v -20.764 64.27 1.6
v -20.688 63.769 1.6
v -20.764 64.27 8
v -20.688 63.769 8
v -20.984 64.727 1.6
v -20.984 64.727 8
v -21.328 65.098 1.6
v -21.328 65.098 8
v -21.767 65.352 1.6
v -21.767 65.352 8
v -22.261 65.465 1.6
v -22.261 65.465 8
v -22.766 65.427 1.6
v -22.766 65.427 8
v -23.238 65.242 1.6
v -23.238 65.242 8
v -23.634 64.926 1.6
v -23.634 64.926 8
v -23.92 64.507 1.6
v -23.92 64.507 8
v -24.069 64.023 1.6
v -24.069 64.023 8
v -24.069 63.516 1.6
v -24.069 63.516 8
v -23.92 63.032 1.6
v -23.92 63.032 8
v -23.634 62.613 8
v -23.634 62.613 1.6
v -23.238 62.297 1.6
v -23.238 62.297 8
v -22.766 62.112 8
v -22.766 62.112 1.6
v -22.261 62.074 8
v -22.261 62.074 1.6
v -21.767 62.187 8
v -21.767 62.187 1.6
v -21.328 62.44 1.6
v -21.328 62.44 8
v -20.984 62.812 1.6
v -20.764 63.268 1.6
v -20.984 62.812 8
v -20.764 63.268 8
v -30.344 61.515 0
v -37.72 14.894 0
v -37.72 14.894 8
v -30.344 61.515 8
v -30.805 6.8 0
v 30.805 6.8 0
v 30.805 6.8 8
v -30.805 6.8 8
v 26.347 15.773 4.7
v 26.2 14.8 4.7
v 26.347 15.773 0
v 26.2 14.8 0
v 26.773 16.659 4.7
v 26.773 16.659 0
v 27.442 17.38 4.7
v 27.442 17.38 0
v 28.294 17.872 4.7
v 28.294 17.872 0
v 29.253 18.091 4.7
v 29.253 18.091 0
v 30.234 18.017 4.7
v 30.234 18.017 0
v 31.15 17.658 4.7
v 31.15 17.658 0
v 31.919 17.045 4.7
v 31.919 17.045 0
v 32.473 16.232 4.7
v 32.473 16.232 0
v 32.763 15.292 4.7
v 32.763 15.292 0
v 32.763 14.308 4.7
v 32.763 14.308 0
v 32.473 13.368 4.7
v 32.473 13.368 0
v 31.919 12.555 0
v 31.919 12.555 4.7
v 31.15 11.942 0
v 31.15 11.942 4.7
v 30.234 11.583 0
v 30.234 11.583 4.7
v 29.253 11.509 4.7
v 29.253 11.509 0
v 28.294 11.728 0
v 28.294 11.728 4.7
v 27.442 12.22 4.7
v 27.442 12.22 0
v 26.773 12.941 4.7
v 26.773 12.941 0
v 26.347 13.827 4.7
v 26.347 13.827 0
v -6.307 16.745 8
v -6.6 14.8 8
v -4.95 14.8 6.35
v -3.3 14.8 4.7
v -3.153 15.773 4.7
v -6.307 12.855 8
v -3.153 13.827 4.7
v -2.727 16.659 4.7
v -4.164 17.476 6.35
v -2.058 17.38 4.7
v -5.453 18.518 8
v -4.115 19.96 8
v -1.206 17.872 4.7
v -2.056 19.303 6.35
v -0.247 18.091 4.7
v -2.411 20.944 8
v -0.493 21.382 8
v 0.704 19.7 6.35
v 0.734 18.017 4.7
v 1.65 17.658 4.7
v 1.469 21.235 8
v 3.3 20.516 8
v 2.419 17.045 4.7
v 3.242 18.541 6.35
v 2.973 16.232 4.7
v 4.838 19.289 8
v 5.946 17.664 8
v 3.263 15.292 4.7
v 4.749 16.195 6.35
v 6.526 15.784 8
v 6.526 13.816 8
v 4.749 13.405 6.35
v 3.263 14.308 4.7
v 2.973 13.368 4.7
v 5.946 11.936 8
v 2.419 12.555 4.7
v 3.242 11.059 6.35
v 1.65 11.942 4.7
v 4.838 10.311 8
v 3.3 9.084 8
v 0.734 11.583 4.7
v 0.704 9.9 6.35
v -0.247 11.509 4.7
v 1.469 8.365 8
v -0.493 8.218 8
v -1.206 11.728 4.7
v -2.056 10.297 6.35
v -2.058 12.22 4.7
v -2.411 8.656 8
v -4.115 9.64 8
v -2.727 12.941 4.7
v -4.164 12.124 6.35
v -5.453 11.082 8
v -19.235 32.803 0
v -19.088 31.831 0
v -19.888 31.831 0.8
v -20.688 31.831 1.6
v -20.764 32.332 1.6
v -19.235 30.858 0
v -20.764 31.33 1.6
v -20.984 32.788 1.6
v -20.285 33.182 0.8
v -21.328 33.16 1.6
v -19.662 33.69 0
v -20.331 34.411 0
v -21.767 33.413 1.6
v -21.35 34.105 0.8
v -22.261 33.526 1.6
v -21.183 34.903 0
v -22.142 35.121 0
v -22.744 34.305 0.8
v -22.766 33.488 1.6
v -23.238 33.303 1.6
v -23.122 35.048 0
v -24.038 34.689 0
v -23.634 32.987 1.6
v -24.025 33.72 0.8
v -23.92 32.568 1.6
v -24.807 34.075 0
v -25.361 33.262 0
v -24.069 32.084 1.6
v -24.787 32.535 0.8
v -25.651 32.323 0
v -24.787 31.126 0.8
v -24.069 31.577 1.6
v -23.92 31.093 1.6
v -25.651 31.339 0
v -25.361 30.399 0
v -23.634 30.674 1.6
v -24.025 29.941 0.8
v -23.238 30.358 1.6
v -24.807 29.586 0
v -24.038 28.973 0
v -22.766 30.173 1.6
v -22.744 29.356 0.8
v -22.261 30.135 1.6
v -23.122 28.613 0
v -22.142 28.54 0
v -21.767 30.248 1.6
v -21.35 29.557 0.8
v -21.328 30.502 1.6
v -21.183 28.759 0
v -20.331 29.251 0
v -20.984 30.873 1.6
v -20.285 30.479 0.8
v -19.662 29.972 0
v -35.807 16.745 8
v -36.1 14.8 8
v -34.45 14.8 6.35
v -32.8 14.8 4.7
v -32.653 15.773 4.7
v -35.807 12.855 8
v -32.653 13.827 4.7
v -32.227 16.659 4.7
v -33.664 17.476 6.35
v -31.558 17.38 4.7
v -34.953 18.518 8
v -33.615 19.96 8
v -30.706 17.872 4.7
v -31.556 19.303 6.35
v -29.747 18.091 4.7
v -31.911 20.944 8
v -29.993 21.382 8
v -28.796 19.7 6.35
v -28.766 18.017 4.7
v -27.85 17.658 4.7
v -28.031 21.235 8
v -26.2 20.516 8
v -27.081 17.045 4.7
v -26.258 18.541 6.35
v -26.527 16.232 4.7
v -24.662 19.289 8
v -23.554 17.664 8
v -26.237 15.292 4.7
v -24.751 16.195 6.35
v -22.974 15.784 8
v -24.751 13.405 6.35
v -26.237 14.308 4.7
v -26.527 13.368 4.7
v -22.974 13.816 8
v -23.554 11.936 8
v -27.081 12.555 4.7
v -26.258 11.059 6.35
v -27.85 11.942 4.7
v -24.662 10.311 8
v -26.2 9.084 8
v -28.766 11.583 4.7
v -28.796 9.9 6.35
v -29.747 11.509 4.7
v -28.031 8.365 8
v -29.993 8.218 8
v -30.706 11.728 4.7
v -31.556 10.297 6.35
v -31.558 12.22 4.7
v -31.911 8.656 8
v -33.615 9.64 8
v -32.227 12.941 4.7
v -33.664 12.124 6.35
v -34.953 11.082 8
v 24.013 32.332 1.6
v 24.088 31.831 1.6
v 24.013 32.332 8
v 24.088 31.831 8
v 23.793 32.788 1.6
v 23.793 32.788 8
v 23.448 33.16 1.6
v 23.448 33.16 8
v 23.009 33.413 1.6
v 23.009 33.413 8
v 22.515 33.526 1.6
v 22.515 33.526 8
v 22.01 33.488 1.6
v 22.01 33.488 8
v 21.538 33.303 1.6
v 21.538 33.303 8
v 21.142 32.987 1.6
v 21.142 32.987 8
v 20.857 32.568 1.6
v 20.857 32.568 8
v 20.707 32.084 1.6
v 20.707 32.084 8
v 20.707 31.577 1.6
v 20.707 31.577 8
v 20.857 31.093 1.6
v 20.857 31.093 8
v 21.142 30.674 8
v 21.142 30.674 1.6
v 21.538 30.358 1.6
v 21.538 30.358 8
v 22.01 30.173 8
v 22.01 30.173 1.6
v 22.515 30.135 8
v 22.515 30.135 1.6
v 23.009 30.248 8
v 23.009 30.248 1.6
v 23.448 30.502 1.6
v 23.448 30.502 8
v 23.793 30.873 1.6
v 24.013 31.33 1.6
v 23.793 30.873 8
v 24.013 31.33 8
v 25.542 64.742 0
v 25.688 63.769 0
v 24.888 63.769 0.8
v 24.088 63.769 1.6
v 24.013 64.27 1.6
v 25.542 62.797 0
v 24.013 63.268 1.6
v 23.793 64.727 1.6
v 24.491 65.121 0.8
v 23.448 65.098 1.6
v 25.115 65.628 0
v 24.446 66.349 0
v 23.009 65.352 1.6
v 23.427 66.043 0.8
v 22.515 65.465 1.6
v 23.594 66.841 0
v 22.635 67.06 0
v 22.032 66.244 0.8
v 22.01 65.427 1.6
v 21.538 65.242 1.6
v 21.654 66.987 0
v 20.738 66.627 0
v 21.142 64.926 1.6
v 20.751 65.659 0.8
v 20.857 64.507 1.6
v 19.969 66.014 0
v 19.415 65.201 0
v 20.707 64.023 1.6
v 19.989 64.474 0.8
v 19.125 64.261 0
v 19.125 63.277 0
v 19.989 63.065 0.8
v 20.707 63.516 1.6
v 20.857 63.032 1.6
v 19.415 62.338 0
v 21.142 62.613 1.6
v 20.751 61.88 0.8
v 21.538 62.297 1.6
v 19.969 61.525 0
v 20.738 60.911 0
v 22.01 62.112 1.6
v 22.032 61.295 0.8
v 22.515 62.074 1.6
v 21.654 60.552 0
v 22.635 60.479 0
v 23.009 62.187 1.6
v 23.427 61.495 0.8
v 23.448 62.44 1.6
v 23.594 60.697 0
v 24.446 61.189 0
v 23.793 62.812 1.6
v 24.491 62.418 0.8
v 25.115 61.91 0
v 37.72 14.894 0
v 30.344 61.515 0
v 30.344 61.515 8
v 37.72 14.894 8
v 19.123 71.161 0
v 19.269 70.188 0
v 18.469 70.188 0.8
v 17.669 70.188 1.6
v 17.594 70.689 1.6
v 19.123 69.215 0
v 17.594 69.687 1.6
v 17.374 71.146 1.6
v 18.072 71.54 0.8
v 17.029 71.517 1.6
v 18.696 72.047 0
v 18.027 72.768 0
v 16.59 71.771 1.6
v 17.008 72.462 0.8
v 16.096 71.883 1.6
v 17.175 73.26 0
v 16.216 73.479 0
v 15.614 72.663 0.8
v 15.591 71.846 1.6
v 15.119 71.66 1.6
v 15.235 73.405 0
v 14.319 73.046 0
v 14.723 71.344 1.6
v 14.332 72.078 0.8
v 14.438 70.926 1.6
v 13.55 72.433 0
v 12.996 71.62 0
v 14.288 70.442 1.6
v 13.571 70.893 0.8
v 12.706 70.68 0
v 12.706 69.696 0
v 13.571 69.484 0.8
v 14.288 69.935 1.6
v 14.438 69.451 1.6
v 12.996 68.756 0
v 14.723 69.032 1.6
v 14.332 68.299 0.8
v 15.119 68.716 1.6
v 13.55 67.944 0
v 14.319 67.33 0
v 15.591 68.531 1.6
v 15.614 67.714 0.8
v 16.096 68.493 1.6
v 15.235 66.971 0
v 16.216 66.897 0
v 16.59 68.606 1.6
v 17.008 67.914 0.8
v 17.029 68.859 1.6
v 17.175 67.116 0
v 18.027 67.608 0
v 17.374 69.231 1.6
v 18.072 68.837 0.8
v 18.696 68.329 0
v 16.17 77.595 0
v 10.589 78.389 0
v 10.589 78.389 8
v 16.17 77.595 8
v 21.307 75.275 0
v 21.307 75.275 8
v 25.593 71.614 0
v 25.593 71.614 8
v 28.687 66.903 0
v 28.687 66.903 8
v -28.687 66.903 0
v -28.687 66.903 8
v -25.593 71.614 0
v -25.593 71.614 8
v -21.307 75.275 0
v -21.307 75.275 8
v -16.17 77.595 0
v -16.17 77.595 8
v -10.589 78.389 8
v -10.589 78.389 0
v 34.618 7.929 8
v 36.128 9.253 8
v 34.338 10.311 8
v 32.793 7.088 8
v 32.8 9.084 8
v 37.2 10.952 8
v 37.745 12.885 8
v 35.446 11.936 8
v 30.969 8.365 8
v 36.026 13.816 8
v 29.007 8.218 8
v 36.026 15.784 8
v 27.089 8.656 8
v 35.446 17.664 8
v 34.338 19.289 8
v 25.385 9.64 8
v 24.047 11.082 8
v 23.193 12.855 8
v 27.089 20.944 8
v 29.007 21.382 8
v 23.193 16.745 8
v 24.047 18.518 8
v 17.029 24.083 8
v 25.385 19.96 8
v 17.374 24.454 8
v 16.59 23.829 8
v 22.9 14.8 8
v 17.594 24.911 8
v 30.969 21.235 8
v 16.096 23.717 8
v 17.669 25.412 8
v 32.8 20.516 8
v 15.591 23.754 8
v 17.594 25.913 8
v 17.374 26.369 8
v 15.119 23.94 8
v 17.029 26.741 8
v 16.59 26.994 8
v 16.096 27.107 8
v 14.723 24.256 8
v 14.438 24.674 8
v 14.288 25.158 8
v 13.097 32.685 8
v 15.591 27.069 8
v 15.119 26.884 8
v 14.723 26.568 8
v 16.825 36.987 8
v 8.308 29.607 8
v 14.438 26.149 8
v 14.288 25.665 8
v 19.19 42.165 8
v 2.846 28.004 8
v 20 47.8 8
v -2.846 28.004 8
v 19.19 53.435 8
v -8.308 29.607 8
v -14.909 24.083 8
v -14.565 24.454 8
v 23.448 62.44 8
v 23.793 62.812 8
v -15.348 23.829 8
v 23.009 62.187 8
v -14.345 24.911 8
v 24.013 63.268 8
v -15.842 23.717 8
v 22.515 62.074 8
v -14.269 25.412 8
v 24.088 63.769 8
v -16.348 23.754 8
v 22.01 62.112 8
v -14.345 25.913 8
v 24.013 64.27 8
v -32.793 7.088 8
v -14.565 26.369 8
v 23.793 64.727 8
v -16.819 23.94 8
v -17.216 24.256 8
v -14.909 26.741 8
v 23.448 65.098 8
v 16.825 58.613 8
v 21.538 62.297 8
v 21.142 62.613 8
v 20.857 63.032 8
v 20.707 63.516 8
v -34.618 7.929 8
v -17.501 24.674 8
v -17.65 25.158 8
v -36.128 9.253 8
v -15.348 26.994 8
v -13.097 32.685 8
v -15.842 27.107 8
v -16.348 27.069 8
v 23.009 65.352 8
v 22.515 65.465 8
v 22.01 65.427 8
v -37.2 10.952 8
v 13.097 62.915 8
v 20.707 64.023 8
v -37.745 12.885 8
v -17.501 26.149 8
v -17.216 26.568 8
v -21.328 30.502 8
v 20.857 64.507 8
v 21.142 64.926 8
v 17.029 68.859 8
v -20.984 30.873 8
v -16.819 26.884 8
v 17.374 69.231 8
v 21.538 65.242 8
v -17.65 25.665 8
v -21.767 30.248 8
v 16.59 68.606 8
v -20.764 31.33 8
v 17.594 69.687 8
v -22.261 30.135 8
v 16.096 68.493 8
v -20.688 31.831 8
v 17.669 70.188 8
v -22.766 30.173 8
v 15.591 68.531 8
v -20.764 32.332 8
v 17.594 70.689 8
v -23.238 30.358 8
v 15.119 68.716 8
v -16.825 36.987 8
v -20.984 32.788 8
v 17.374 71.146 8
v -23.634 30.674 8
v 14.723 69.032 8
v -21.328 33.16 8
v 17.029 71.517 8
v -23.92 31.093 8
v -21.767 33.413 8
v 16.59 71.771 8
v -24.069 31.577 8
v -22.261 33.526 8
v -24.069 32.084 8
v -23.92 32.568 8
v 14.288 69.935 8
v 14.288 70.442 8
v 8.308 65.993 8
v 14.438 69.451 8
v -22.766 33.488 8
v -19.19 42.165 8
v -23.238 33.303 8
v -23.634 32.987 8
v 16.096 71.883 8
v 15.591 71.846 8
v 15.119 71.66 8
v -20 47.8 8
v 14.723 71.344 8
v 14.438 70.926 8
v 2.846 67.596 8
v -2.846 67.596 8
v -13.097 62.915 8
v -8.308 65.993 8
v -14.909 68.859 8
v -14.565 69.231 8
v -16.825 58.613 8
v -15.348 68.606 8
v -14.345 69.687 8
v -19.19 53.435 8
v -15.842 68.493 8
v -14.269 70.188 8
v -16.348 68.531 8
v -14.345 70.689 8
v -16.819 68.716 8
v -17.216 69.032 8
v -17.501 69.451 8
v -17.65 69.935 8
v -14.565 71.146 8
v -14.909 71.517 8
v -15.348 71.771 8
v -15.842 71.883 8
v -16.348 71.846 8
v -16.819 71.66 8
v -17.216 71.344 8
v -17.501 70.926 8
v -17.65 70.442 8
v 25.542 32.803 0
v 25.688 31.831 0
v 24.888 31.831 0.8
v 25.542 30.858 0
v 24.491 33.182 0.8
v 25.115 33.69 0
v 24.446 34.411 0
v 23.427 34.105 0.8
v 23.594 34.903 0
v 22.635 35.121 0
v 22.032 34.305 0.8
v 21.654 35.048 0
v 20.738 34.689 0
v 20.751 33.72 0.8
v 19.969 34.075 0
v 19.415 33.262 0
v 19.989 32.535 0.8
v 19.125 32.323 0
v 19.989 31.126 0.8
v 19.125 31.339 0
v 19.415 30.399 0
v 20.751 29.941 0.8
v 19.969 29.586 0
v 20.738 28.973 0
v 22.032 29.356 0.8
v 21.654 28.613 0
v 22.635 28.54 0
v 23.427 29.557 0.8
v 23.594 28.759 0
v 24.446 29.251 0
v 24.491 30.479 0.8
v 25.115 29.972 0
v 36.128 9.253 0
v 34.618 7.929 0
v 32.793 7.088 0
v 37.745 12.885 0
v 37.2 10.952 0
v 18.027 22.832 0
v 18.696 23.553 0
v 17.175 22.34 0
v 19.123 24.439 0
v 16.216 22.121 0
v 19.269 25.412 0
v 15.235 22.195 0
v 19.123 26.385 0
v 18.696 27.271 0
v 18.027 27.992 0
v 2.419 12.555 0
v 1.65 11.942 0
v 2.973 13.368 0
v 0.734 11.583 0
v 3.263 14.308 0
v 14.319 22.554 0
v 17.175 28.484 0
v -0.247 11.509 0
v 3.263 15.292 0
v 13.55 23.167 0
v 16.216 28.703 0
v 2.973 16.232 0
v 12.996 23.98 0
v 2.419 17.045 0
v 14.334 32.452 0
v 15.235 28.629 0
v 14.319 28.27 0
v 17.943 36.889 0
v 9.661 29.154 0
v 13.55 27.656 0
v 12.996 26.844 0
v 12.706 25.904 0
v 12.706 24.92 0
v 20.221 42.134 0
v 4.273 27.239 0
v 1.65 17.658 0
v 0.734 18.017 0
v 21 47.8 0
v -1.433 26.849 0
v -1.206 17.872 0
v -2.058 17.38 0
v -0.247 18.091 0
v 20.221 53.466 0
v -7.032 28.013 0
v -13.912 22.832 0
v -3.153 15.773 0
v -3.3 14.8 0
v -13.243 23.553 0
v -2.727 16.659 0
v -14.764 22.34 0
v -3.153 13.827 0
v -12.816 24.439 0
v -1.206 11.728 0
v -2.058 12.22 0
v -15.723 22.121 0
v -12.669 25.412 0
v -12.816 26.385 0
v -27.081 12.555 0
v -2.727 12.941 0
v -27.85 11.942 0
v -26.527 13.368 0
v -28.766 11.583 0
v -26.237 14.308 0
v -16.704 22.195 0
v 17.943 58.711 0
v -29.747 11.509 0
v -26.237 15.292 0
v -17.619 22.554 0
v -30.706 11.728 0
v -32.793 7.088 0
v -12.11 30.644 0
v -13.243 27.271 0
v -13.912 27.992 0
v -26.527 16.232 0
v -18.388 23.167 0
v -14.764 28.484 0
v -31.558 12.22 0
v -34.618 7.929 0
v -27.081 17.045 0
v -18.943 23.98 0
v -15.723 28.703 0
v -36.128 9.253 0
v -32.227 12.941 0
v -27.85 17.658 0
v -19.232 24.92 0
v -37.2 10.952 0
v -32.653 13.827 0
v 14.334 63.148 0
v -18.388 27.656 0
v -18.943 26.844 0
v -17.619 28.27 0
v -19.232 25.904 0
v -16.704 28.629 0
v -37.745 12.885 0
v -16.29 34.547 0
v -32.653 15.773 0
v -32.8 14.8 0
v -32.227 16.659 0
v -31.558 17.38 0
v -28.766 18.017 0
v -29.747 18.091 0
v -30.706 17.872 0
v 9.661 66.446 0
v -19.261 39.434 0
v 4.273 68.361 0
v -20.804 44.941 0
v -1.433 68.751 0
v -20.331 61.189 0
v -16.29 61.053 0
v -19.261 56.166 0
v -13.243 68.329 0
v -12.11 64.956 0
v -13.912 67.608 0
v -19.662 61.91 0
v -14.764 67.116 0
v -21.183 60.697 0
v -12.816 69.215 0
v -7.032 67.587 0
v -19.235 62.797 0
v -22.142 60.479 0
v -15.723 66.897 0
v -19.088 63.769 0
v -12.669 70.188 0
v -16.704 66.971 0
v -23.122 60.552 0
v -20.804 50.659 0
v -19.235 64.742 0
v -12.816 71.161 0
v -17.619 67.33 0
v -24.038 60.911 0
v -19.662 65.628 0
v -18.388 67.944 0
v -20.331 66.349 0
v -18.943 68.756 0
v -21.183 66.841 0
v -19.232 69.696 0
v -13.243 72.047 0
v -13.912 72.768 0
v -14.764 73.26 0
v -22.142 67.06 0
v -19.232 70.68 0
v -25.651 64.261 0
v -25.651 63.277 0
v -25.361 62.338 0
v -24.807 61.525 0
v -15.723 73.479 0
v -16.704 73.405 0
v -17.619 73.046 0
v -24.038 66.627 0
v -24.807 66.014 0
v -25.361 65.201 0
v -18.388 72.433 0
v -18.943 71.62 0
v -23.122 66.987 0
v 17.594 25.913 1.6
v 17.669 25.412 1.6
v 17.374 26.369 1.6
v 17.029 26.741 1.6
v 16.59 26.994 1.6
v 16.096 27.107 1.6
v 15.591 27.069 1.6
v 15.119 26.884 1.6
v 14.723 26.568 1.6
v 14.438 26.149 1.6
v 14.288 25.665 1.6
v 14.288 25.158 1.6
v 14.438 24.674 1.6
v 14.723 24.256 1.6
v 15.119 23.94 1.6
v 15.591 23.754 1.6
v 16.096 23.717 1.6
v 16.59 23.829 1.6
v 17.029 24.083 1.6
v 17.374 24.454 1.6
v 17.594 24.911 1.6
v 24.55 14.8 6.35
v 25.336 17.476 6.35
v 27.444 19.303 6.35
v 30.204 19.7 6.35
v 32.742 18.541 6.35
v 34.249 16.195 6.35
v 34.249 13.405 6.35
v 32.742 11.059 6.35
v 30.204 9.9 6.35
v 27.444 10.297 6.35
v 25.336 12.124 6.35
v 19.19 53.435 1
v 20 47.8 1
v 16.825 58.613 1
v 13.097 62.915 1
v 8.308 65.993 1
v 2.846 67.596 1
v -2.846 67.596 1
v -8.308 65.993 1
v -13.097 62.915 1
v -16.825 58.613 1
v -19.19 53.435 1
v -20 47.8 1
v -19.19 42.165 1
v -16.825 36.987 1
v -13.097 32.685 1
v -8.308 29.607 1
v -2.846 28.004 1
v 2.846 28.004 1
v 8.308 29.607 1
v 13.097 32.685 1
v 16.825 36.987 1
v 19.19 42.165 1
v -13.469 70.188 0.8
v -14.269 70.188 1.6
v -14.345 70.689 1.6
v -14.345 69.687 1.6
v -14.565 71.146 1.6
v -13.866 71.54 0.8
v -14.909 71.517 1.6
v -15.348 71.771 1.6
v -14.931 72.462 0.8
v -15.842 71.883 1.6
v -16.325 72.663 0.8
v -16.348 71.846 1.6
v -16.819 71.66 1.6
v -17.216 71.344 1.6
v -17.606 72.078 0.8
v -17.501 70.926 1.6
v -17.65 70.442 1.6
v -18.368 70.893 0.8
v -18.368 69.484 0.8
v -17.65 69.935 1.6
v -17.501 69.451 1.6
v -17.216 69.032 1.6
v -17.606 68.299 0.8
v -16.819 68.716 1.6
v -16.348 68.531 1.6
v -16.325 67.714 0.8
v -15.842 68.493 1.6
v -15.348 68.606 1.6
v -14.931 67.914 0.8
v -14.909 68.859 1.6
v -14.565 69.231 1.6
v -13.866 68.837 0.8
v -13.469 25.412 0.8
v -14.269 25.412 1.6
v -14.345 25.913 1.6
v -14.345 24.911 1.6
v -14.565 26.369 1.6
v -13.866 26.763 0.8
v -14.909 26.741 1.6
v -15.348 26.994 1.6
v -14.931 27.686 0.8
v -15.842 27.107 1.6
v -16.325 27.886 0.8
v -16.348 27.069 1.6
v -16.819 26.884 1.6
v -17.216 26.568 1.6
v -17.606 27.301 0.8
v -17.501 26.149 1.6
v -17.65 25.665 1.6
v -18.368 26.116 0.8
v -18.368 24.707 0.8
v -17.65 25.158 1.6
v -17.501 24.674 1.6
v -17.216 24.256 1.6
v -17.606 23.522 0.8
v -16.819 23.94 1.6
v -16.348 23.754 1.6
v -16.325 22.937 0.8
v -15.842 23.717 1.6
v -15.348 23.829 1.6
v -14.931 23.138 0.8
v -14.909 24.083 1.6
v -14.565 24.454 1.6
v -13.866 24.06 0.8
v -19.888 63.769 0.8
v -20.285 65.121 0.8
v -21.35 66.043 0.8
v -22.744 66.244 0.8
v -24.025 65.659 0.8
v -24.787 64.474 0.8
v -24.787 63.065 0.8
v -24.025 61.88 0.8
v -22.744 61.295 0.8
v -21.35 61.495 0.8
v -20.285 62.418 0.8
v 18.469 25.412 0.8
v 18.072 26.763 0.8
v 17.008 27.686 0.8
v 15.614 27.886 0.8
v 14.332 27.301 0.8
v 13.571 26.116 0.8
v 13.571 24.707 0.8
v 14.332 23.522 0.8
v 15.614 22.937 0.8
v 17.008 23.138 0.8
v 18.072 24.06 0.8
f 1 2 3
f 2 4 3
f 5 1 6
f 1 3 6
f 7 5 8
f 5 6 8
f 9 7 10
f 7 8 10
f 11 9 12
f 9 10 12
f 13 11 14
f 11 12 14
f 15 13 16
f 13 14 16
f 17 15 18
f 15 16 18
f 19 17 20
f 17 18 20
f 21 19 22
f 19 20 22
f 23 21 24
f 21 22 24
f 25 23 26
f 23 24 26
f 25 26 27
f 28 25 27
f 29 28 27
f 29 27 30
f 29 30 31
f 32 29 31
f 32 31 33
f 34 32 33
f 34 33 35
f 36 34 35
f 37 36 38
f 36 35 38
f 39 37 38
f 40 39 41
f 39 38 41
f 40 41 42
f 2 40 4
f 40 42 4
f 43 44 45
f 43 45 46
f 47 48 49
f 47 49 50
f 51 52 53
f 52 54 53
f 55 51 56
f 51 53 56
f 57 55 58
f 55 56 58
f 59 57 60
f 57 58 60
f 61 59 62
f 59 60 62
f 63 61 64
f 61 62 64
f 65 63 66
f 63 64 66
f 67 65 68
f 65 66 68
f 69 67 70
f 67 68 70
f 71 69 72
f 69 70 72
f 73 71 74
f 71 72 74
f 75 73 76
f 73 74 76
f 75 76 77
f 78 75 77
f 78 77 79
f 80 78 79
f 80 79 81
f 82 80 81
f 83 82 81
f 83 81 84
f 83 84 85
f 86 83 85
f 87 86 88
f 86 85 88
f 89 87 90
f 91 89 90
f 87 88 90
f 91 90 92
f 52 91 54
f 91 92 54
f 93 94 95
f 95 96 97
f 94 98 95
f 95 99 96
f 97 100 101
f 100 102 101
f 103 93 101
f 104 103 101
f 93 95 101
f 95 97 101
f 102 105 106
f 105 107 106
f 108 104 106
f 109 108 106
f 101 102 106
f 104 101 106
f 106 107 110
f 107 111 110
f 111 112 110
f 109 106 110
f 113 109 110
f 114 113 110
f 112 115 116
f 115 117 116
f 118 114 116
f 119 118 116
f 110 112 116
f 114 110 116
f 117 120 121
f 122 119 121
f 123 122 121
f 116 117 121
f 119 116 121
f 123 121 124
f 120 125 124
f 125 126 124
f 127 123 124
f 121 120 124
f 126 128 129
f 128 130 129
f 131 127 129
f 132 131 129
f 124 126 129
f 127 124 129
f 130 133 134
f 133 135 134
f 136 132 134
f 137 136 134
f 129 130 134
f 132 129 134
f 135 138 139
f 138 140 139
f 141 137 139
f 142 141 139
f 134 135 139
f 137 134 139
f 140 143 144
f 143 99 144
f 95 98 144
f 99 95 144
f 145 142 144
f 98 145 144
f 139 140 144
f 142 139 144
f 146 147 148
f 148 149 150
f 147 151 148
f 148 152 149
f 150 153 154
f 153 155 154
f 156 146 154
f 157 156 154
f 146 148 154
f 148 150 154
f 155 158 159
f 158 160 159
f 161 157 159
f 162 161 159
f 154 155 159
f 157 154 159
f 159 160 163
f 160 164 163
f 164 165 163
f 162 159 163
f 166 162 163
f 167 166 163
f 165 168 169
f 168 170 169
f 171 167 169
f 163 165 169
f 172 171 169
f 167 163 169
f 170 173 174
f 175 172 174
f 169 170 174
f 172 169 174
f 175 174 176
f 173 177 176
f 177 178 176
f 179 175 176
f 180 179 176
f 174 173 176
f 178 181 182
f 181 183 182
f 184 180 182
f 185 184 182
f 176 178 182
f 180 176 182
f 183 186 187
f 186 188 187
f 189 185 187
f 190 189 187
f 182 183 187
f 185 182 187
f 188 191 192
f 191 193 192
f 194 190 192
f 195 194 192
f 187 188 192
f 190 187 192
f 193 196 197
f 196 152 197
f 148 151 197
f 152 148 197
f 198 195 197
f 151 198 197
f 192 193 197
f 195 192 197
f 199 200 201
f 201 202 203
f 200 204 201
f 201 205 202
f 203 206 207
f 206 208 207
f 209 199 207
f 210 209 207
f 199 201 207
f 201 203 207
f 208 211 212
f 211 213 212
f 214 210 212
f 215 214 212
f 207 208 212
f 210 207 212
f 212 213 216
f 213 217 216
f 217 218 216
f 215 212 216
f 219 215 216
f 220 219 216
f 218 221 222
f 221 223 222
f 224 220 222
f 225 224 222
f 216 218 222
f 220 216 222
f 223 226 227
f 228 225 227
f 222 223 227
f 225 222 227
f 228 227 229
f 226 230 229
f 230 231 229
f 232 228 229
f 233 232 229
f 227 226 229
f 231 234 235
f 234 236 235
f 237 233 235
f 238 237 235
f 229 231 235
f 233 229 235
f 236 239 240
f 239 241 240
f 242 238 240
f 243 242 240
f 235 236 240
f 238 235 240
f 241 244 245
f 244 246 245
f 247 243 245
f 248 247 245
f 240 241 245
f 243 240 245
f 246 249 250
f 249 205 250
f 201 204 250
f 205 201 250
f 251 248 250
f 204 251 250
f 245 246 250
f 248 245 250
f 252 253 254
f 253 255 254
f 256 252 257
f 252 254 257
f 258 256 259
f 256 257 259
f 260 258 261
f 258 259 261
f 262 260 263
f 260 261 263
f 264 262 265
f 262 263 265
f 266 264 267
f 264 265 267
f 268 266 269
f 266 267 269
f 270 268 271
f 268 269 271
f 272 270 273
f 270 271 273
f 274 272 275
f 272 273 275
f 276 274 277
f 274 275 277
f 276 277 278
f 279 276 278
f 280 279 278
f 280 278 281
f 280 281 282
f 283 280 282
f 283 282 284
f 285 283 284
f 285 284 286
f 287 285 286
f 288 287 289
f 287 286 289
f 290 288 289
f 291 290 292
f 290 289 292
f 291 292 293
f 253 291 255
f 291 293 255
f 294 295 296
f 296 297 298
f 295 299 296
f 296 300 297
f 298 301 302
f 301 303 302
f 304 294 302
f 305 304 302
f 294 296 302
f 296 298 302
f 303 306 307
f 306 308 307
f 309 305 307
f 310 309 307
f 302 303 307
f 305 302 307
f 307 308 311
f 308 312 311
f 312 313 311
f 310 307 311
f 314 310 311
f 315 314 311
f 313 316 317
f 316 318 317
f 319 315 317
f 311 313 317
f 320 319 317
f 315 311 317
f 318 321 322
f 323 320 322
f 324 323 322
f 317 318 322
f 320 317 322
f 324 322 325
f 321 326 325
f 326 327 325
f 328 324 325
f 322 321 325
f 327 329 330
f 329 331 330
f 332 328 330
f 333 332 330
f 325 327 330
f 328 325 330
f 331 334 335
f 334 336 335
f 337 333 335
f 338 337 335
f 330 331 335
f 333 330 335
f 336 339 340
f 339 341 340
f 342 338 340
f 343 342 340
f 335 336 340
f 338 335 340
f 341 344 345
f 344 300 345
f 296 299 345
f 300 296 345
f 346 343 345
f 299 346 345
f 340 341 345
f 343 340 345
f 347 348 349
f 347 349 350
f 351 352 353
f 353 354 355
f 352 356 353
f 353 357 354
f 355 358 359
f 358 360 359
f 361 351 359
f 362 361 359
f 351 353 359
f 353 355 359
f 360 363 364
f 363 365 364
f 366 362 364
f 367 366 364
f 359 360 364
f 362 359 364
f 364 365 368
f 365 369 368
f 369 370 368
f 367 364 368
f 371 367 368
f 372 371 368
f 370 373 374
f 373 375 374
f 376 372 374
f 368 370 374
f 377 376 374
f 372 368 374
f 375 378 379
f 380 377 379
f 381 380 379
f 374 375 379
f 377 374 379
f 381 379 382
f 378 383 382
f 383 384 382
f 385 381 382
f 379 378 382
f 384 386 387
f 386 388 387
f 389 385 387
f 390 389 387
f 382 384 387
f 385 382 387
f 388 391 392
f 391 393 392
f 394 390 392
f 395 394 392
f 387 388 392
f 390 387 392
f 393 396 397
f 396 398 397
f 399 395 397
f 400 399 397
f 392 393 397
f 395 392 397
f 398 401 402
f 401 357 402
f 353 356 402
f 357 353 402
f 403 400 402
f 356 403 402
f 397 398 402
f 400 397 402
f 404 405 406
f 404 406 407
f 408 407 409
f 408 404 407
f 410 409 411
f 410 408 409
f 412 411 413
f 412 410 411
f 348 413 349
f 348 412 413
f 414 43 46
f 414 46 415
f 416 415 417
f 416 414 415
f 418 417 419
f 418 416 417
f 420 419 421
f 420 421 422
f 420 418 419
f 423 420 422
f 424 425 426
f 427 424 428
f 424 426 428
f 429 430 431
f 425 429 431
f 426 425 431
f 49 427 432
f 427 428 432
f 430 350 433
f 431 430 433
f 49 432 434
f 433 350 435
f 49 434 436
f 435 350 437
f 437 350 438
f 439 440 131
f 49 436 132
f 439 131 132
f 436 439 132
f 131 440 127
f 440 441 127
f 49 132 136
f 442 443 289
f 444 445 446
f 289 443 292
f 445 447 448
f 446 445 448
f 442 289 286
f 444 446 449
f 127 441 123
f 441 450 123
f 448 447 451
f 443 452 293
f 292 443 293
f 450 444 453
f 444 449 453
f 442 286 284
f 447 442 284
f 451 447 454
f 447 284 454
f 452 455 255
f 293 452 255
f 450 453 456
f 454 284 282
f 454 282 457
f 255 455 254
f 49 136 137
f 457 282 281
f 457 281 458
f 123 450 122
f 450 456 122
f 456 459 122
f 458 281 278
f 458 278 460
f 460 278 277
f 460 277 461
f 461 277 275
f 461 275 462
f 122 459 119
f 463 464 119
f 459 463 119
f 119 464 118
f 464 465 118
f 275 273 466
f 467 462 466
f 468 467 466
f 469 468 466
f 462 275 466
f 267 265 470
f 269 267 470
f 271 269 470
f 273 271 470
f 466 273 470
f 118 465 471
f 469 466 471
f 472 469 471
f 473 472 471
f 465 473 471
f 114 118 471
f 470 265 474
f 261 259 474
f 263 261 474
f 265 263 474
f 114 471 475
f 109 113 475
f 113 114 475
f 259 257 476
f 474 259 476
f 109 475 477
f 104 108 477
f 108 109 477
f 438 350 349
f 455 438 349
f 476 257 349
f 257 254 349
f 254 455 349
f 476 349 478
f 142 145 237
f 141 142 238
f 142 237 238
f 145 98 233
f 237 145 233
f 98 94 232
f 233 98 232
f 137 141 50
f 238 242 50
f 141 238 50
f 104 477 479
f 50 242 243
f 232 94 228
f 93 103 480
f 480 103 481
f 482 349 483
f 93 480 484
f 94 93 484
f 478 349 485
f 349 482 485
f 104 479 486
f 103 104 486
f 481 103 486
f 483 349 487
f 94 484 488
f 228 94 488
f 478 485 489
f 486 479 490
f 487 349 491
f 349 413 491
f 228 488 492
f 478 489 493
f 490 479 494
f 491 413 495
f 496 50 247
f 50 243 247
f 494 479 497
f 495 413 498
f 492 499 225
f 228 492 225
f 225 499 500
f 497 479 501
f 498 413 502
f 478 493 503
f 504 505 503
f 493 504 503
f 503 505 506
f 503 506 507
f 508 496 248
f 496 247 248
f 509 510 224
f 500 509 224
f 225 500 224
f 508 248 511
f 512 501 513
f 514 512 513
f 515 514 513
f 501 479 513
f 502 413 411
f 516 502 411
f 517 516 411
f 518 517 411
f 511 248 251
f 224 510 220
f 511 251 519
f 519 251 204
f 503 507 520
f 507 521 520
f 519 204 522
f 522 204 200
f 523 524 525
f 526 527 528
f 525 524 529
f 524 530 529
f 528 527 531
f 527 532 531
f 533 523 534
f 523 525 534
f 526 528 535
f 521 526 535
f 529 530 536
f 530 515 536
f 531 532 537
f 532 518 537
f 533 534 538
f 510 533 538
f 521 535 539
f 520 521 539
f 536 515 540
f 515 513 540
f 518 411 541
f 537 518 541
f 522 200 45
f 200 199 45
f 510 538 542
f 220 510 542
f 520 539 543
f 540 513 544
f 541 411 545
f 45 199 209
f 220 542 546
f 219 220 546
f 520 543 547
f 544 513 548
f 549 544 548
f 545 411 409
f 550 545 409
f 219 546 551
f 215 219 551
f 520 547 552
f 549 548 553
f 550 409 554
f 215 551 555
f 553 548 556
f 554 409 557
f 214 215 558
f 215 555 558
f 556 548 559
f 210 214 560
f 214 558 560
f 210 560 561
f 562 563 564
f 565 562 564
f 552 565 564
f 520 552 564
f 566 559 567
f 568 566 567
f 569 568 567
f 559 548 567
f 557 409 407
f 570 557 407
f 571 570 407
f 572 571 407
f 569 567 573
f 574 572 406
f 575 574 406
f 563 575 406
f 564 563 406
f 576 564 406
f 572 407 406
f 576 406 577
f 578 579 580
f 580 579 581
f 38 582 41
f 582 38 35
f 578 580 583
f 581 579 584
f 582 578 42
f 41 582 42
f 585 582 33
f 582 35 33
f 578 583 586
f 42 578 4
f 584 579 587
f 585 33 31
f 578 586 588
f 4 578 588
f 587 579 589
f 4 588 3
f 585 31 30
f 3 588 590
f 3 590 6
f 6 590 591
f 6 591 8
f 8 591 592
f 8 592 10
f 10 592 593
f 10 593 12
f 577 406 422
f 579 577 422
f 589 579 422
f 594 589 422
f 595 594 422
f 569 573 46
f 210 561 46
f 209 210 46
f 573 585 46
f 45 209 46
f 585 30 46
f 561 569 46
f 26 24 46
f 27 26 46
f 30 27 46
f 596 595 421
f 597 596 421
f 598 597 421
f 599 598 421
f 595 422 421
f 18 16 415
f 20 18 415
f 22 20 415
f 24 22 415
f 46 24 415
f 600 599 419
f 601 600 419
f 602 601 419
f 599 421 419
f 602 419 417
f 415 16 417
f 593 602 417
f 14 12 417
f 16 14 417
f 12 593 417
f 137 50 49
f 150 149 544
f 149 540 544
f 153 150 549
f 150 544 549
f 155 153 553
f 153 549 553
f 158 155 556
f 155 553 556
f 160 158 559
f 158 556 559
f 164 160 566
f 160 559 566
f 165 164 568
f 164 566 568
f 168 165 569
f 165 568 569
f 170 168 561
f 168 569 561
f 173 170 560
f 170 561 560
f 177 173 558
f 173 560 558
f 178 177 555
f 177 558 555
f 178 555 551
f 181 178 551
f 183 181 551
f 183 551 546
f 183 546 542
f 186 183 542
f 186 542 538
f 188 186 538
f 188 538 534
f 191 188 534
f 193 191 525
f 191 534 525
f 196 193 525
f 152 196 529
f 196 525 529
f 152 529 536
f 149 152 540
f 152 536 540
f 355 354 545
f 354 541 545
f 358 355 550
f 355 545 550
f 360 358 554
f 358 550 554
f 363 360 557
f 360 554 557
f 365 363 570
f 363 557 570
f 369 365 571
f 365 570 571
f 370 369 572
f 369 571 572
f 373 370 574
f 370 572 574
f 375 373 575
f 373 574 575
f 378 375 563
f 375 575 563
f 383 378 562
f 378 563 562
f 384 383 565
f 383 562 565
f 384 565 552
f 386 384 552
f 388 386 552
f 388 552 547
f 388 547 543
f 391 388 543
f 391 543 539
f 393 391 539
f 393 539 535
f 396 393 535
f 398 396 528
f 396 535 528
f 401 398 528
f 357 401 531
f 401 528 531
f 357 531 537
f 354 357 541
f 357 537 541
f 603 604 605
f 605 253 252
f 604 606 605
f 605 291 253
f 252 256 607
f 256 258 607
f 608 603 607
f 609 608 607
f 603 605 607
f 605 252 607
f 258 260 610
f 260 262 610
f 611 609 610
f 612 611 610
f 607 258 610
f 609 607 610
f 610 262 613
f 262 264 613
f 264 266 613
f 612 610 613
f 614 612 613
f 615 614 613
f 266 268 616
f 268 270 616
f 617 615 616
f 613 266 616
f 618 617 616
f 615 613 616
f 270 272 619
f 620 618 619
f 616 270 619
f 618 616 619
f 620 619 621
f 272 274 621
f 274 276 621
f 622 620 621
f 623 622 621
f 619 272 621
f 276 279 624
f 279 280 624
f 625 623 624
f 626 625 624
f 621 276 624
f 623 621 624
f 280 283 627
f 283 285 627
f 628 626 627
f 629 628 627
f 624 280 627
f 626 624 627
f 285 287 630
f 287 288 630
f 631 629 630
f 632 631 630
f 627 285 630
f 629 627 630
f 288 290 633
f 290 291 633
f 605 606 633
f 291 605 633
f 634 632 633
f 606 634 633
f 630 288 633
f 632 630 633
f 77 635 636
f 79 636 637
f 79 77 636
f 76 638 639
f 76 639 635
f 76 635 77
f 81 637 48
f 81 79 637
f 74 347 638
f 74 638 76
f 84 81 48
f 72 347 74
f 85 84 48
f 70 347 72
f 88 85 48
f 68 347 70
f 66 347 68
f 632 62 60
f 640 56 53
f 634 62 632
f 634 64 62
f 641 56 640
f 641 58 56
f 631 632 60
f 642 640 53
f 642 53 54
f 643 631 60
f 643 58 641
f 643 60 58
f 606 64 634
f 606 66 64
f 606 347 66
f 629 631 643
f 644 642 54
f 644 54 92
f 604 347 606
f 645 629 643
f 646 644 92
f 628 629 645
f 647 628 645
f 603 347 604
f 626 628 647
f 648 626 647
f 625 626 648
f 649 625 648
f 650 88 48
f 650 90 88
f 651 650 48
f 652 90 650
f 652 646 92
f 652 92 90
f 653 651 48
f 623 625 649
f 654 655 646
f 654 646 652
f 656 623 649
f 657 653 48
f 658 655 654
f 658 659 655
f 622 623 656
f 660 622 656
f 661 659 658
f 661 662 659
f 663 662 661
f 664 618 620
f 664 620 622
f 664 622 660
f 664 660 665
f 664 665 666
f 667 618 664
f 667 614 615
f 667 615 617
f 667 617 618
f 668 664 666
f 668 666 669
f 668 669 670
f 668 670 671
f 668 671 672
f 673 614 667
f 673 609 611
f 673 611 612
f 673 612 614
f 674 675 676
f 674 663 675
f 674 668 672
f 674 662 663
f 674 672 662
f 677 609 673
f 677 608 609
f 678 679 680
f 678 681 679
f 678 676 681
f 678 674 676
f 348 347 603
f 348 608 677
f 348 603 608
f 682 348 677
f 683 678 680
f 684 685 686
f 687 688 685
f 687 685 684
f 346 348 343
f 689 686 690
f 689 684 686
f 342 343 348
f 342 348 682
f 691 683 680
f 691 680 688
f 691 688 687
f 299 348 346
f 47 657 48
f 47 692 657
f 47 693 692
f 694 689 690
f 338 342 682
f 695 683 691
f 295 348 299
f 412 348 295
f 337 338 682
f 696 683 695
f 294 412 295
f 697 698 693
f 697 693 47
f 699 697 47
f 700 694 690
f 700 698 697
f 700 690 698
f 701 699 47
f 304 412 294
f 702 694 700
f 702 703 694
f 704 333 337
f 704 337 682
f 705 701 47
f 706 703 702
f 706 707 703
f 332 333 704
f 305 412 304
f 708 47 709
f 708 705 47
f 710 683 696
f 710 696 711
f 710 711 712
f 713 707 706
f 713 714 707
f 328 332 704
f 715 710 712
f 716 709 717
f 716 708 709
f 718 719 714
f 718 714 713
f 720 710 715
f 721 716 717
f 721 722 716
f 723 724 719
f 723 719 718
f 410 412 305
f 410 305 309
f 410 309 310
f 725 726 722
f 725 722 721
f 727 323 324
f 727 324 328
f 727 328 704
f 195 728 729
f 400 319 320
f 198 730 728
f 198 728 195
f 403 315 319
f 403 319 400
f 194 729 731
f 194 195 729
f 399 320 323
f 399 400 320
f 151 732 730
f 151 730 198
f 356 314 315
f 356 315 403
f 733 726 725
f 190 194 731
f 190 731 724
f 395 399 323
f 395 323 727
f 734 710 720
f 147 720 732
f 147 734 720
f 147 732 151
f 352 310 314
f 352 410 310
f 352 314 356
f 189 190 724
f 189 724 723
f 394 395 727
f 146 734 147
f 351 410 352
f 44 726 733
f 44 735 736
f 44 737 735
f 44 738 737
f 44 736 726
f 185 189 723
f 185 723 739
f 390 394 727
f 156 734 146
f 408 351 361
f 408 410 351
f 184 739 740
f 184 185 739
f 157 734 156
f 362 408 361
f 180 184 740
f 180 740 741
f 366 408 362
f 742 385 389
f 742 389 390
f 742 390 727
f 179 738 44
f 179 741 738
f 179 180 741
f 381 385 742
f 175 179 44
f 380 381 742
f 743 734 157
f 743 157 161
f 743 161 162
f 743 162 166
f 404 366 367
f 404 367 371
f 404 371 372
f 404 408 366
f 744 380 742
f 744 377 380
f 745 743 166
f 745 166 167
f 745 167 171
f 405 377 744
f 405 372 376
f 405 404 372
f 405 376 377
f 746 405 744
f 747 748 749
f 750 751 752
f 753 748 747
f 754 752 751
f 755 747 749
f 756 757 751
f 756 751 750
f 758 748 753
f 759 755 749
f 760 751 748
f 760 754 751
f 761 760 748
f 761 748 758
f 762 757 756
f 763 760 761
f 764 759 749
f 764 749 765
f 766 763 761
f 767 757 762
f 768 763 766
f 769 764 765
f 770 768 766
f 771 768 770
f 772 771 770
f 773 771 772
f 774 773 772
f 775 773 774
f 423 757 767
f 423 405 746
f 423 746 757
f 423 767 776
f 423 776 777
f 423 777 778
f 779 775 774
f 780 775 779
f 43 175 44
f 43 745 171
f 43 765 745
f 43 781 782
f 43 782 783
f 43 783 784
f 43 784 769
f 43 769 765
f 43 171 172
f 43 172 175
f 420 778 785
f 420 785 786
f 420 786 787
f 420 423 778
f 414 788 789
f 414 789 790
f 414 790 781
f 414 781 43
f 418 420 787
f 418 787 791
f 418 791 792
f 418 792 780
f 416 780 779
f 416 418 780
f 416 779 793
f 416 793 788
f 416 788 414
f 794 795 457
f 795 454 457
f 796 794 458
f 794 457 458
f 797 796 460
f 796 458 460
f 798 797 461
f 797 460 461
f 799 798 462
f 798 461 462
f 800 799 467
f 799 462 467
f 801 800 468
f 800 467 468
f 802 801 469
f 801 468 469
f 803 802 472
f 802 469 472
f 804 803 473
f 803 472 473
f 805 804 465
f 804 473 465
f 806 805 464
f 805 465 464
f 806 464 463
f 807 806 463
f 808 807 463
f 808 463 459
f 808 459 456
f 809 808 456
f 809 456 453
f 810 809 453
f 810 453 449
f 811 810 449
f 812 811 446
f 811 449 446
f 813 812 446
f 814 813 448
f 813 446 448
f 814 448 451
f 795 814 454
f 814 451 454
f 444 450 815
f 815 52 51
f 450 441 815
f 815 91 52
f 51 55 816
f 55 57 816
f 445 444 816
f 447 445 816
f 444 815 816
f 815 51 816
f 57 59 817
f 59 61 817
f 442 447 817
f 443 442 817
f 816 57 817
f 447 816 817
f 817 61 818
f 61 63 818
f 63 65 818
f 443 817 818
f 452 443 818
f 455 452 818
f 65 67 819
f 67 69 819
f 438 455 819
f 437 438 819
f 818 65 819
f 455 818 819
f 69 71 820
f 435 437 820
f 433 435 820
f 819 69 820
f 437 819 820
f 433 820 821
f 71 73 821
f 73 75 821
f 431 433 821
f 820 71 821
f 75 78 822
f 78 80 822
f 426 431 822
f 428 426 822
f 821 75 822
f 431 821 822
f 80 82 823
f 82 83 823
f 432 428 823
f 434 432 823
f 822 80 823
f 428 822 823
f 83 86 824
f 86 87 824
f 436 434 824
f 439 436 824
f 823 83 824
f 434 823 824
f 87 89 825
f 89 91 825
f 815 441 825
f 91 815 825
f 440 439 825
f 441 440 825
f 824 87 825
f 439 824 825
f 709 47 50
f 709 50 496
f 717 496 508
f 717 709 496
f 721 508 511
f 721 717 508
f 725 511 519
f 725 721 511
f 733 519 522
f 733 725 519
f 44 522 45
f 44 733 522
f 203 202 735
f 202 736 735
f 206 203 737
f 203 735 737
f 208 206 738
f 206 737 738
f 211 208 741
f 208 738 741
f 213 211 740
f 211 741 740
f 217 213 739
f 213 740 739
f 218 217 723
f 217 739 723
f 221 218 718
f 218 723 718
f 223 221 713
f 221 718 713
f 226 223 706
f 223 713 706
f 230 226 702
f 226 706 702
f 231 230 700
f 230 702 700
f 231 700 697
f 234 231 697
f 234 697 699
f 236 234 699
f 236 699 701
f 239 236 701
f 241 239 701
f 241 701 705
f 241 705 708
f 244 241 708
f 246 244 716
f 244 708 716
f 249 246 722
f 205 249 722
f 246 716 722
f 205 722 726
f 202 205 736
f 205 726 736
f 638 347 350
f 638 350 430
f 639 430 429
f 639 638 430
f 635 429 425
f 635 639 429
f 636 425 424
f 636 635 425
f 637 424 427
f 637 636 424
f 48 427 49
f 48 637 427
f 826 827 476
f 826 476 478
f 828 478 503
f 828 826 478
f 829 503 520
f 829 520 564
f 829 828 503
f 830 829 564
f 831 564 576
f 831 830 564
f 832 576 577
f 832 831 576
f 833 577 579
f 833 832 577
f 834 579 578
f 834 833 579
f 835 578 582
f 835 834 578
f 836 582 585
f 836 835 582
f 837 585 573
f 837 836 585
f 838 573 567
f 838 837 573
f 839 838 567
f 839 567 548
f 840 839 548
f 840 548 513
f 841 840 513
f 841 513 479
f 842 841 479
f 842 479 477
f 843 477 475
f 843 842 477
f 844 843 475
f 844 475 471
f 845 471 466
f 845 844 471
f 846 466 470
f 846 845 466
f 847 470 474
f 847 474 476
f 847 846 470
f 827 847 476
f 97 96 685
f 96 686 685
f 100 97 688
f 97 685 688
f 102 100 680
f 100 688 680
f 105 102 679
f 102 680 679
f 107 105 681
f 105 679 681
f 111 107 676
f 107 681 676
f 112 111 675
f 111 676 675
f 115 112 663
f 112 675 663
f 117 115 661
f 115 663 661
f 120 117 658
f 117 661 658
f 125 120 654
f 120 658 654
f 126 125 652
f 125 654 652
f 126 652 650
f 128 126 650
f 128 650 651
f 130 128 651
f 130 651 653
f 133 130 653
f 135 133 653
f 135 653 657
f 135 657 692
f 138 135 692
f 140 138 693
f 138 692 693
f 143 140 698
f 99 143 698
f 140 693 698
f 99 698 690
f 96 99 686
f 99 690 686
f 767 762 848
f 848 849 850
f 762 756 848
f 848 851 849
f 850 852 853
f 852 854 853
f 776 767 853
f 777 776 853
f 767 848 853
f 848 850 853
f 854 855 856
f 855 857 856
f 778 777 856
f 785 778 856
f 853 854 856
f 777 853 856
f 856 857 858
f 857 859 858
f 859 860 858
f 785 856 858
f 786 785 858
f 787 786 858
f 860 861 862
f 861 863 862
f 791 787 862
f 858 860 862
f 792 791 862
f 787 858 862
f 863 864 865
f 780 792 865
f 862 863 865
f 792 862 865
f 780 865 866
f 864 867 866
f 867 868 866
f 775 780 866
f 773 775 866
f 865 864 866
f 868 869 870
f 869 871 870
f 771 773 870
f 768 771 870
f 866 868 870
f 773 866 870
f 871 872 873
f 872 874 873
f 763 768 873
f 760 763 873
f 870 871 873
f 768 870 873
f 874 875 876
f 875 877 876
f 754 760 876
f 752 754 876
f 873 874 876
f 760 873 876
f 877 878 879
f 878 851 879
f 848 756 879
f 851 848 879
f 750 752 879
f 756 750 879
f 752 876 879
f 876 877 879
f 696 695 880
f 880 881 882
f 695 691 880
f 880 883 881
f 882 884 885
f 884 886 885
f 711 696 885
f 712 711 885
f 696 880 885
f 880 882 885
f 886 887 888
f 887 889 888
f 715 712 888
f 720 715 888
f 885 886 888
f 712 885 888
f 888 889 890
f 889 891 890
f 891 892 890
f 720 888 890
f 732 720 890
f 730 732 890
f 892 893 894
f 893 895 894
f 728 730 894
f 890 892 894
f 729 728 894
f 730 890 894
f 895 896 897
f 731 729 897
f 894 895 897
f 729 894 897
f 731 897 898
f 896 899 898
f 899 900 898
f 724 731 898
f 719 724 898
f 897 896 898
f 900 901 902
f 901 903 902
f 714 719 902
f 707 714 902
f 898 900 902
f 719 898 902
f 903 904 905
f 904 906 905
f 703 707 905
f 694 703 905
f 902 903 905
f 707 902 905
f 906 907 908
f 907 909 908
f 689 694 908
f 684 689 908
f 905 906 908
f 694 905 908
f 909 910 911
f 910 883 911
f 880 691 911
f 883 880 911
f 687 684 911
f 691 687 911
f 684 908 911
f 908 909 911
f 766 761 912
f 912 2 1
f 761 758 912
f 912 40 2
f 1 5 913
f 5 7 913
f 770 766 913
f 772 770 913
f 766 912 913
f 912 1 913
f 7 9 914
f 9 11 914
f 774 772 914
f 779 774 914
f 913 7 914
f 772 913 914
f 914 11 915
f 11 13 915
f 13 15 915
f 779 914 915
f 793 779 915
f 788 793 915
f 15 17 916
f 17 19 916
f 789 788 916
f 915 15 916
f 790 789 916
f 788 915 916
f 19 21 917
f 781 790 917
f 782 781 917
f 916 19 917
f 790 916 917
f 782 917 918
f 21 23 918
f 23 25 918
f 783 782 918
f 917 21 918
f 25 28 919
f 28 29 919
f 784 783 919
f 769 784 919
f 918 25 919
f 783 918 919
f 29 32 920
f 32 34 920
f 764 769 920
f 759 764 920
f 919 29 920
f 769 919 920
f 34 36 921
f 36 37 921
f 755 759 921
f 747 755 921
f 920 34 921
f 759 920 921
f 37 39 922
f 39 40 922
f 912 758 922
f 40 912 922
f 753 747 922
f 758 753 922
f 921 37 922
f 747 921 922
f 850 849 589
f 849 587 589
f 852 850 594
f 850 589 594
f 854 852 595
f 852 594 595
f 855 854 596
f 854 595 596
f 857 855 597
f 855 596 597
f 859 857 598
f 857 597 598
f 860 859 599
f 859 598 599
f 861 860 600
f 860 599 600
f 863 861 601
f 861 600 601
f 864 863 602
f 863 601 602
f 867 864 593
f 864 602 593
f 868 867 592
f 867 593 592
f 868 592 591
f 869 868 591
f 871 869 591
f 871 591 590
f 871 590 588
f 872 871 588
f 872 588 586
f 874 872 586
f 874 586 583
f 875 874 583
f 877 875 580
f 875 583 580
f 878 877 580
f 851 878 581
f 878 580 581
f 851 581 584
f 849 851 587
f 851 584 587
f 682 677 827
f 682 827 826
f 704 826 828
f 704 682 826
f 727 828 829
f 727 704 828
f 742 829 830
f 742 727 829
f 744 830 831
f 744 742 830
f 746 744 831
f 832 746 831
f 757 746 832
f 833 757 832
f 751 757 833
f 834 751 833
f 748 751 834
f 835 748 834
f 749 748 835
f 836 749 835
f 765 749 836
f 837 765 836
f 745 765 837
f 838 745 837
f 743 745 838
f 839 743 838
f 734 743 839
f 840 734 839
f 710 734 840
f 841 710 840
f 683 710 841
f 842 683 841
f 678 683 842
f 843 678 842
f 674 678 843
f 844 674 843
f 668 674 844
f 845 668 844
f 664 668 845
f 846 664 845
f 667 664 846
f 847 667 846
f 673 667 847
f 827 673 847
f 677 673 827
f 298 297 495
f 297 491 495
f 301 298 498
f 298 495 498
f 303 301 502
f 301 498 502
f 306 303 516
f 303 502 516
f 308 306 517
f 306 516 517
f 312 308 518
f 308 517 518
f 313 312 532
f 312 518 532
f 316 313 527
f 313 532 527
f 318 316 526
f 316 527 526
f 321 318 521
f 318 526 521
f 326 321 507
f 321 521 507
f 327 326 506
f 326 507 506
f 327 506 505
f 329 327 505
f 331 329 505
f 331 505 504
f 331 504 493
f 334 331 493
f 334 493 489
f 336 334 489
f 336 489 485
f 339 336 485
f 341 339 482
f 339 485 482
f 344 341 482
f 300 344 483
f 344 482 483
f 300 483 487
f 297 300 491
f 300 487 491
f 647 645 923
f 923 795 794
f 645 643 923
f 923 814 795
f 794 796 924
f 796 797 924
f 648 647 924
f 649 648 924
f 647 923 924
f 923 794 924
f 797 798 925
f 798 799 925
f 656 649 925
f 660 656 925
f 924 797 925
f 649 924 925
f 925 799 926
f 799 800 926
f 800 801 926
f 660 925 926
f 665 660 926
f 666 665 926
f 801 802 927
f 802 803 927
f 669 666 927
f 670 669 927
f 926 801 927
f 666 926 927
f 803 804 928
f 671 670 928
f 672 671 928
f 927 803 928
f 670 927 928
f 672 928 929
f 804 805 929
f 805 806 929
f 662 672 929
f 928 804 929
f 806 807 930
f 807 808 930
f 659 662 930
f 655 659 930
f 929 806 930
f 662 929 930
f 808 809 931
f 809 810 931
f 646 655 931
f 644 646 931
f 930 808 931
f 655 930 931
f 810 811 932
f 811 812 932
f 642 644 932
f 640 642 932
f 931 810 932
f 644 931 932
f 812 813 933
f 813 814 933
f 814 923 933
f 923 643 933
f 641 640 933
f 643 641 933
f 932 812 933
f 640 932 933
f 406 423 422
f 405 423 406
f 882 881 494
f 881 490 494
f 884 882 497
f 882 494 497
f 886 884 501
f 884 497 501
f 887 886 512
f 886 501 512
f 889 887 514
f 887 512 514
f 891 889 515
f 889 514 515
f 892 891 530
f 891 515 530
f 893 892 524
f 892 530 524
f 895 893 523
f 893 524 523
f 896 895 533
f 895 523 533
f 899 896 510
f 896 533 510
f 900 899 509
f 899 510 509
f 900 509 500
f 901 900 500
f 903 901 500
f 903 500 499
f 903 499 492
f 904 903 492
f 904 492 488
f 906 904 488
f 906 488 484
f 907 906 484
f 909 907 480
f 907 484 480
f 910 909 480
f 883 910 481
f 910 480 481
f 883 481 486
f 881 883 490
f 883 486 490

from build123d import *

# Parameters (mm, degrees)
SKETCH_1_R                = 20
SKETCH_1_R_2              = 1.5
SKETCH_1_R_3              = 3
EXTRUDE_1_DEPTH           = 8
HOLE_WIZARD_1_D           = 3.4
HOLE_WIZARD_1_DEPTH       = 8.1
HOLE_WIZARD_1_CSINK_D     = 6.6
HOLE_WIZARD_1_CSINK_ANGLE = 90
HOLE_WIZARD_1_TIP         = 1.021463052
HOLE_WIZARD_2_D           = 6.6
HOLE_WIZARD_2_DEPTH       = 8.1
HOLE_WIZARD_2_CSINK_D     = 13.2
HOLE_WIZARD_2_CSINK_ANGLE = 90
HOLE_WIZARD_2_TIP         = 1.982840043
CHAMFER_1_SIZE            = 1


with BuildPart() as part:
    # 草图1 → 凸台-拉伸1 (new body)
    with BuildSketch(Plane.XY):
        with BuildLine():
            Line((-37.719505087, 14.893838596), (-30.34379321, 61.5147356))
            ThreePointArc((-30.34379321, 61.5147356), (-23.579766095, 73.596472023), (-10.589482469, 78.389482469))
            Line((-10.589482469, 78.389482469), (10.589482469, 78.389482469))
            ThreePointArc((10.589482469, 78.389482469), (23.579766095, 73.596472023), (30.34379321, 61.5147356))
            Line((30.34379321, 61.5147356), (37.719505087, 14.893838596))
            ThreePointArc((37.719505087, 14.893838596), (36.127942671, 9.253400731), (30.805496327, 6.8))
            Line((30.805496327, 6.8), (-30.805496327, 6.8))
            ThreePointArc((-30.805496327, 6.8), (-36.127942671, 9.253400731), (-37.719505087, 14.893838596))
        make_face()
        with Locations((0, 47.8)):
            Circle(SKETCH_1_R, mode=Mode.SUBTRACT)
        with Locations((-15.969331282, 70.188176755)):
            Circle(SKETCH_1_R_2, mode=Mode.SUBTRACT)
        with Locations((-22.388176755, 63.769331282)):
            Circle(SKETCH_1_R_2, mode=Mode.SUBTRACT)
        with Locations((-22.388176755, 31.830668718)):
            Circle(SKETCH_1_R_2, mode=Mode.SUBTRACT)
        with Locations((-15.969331282, 25.411823245)):
            Circle(SKETCH_1_R_2, mode=Mode.SUBTRACT)
        with Locations((15.969331282, 25.411823245)):
            Circle(SKETCH_1_R_2, mode=Mode.SUBTRACT)
        with Locations((22.388176755, 31.830668718)):
            Circle(SKETCH_1_R_2, mode=Mode.SUBTRACT)
        with Locations((22.388176755, 63.769331282)):
            Circle(SKETCH_1_R_2, mode=Mode.SUBTRACT)
        with Locations((15.969331282, 70.188176755)):
            Circle(SKETCH_1_R_2, mode=Mode.SUBTRACT)
        with Locations((-29.5, 14.8)):
            Circle(SKETCH_1_R_3, mode=Mode.SUBTRACT)
        with Locations((0, 14.8)):
            Circle(SKETCH_1_R_3, mode=Mode.SUBTRACT)
        with Locations((29.5, 14.8)):
            Circle(SKETCH_1_R_3, mode=Mode.SUBTRACT)
    extrude(amount=EXTRUDE_1_DEPTH)

    # 打孔尺寸(%根据十字)槽沉头木螺钉的类型1
    with Locations(Plane(origin=(0, 0, 0), x_dir=(-1, 0, 0), z_dir=(0, 0, -1))):
        with Locations((-22.388176755, 63.769331282), (-15.969331282, 70.188176755), (15.969331282, 70.188176755), (22.388176755, 63.769331282), (-22.388176755, 31.830668718), (-15.969331282, 25.411823245), (15.969331282, 25.411823245), (22.388176755, 31.830668718)):
            CounterSinkHole(HOLE_WIZARD_1_D / 2, HOLE_WIZARD_1_CSINK_D / 2, depth=HOLE_WIZARD_1_DEPTH, counter_sink_angle=HOLE_WIZARD_1_CSINK_ANGLE)
            with Locations((0, 0, -(HOLE_WIZARD_1_DEPTH + HOLE_WIZARD_1_TIP / 2))):  # 118° drill point
                Cone(0, HOLE_WIZARD_1_D / 2, HOLE_WIZARD_1_TIP, mode=Mode.SUBTRACT)

    # 打孔尺寸(%根据十字)槽沉头木螺钉的类型2
    with Locations(Plane.XY.offset(8)):
        with Locations((29.5, 14.8), (0, 14.8), (-29.5, 14.8)):
            CounterSinkHole(HOLE_WIZARD_2_D / 2, HOLE_WIZARD_2_CSINK_D / 2, depth=HOLE_WIZARD_2_DEPTH, counter_sink_angle=HOLE_WIZARD_2_CSINK_ANGLE)
            with Locations((0, 0, -(HOLE_WIZARD_2_DEPTH + HOLE_WIZARD_2_TIP / 2))):  # 118° drill point
                Cone(0, HOLE_WIZARD_2_D / 2, HOLE_WIZARD_2_TIP, mode=Mode.SUBTRACT)

    # 倒角1
    chamfer_1_edges = [part.edges().sort_by_distance(p)[0] for p in [
        (-20, 47.8, 0),
    ]]
    chamfer(chamfer_1_edges, length=CHAMFER_1_SIZE)


solid = part.part
